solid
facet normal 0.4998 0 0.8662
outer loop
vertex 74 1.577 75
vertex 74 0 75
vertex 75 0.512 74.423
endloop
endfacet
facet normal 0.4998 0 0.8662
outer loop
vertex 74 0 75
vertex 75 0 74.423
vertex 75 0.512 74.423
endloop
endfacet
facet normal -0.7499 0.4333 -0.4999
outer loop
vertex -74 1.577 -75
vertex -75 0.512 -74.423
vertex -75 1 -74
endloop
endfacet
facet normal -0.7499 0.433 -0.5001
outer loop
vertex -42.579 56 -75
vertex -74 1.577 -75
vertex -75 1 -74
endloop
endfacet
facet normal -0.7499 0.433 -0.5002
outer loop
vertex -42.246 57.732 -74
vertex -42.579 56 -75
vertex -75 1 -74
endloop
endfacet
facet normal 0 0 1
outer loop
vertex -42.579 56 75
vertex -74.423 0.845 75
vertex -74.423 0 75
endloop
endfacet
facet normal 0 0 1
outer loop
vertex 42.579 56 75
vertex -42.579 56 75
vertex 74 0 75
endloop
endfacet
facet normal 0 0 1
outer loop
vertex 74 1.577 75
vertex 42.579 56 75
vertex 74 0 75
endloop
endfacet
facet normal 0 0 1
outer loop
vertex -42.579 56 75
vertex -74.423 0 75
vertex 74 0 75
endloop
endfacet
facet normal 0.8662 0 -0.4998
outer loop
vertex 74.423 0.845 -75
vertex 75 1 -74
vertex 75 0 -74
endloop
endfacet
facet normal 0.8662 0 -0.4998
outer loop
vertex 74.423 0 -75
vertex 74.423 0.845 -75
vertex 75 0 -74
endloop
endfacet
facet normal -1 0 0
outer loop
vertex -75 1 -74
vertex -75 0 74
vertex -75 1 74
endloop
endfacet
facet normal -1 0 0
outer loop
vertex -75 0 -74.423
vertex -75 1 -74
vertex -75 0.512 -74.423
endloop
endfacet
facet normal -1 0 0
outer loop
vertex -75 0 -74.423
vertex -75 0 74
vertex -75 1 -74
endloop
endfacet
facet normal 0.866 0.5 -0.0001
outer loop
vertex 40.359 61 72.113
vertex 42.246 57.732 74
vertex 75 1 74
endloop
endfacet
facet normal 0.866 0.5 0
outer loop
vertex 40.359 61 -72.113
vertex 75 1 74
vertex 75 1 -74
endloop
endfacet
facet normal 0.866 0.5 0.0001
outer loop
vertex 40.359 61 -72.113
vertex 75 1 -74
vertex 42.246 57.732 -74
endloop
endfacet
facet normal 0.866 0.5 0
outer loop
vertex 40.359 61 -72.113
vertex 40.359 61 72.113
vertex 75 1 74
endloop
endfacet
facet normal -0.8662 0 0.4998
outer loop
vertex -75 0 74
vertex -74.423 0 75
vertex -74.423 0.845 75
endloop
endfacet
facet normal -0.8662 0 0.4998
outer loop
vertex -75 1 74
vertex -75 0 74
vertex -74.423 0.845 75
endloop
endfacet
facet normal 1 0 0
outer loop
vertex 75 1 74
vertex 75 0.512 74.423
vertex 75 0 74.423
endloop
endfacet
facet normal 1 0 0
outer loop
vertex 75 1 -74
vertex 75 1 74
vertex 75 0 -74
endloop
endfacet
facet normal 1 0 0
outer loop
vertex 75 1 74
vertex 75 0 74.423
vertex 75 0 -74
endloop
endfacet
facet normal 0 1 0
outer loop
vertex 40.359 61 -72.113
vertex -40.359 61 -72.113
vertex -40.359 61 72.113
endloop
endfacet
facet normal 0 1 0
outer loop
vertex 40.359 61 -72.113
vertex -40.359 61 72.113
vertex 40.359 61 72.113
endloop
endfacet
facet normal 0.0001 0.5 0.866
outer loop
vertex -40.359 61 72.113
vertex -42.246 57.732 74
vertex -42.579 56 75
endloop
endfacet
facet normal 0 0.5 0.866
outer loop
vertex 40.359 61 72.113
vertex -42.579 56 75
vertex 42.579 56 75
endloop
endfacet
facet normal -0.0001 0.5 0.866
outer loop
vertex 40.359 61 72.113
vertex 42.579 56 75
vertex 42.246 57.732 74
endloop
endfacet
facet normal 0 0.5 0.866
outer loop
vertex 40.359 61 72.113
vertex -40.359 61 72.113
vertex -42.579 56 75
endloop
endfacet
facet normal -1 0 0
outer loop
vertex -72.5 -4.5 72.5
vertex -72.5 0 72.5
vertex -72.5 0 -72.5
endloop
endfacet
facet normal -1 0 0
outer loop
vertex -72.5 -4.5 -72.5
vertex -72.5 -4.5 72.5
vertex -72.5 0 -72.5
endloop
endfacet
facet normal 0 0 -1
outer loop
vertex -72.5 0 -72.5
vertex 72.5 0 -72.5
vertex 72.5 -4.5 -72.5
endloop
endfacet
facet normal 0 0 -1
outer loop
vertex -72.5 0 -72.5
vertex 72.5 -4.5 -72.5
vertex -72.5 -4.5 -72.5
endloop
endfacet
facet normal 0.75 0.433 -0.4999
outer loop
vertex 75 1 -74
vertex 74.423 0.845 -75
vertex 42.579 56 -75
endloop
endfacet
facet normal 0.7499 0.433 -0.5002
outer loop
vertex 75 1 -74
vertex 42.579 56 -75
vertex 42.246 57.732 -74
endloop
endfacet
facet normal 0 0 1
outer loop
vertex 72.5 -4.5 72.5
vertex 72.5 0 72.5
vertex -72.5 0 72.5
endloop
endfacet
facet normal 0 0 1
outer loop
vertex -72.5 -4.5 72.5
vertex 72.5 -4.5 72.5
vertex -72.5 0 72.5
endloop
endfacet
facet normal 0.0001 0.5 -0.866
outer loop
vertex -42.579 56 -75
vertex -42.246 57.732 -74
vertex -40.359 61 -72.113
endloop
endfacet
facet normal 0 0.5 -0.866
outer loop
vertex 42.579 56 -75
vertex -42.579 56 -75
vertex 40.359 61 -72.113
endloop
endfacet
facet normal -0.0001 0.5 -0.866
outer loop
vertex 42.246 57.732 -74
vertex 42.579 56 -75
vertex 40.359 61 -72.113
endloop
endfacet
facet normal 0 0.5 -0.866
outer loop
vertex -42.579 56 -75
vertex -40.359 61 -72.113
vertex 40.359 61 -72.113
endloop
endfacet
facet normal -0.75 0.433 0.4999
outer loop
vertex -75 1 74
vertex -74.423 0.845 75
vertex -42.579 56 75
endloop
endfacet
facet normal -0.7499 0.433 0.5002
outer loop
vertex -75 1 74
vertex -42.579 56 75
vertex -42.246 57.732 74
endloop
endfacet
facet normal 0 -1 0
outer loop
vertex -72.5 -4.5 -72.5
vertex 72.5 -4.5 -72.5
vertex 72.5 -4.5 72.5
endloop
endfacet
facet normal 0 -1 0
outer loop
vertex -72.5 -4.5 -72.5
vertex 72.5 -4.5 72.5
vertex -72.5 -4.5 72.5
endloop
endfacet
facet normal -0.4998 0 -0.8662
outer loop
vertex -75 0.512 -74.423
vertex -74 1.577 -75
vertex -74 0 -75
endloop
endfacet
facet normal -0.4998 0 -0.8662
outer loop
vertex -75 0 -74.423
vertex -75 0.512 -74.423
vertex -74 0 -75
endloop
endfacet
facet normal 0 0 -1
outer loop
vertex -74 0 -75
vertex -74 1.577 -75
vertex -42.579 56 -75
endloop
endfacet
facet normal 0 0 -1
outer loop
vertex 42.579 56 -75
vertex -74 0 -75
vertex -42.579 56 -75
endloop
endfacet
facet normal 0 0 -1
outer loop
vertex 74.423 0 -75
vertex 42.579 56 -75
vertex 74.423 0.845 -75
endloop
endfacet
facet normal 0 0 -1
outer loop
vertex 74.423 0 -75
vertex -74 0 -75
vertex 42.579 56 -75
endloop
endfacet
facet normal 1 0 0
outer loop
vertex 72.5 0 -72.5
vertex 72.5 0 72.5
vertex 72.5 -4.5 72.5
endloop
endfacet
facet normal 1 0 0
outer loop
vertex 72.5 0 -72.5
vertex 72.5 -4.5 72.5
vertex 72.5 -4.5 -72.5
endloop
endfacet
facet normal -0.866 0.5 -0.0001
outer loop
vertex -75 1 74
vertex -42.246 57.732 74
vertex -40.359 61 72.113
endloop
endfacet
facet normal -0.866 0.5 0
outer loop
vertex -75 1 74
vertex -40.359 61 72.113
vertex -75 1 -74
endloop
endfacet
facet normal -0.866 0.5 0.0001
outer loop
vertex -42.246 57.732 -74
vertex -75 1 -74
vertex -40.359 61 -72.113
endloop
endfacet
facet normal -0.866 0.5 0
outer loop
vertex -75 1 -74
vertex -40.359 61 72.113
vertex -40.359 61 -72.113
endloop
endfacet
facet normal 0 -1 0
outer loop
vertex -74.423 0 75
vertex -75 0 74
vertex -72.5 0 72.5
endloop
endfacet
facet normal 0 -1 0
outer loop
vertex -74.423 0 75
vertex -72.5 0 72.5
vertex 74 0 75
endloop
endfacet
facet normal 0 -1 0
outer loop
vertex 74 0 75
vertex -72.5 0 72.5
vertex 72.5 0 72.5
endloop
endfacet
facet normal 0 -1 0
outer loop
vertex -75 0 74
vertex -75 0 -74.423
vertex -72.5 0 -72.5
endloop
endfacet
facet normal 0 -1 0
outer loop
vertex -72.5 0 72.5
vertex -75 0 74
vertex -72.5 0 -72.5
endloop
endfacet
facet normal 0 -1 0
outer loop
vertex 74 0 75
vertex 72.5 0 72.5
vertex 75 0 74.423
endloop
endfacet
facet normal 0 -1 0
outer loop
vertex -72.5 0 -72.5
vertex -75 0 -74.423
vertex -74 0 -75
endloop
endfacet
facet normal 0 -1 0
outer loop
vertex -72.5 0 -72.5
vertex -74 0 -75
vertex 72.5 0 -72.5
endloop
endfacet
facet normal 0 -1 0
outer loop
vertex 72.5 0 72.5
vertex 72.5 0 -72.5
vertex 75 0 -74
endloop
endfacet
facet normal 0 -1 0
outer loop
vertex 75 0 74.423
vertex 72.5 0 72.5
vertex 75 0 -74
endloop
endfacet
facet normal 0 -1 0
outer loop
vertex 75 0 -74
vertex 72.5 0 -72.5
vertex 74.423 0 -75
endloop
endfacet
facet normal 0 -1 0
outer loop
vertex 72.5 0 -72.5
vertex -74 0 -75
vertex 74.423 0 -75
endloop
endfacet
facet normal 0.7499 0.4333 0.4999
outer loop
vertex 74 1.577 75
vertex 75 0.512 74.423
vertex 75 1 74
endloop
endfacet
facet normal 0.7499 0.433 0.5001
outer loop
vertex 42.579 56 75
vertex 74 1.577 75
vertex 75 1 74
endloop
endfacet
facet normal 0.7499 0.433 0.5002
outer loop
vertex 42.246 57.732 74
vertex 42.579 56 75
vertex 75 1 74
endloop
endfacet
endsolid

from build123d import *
from OCP.BRepFilletAPI import BRepFilletAPI_MakeChamfer

# Parameters (mm, degrees)
SKETCH1_W           = 150
SKETCH1_H           = 150
BOSS_EXTRUDE1_DEPTH = 1
SKETCH2_W           = 150
SKETCH2_H           = 150
BOSS_EXTRUDE2_DEPTH = 60
CHAMFER1_SIZE       = 60
CHAMFER1_SIZE2      = 34.641016151
CHAMFER2_SIZE       = 5
CHAMFER2_SIZE2      = 2.886751346
CHAMFER3_SIZE       = 1
CHAMFER3_SIZE2      = 0.577350269
CHAMFER4_SIZE       = 1
CHAMFER4_SIZE2      = 0.577350269
SKETCH3_W           = 145
SKETCH3_H           = 145
BOSS_EXTRUDE3_DEPTH = 4.5


with BuildPart() as part:
    # Sketch1 → Boss-Extrude1 (new body)
    with BuildSketch(Plane(origin=(0, 0, 0), x_dir=(1, 0, 0), z_dir=(0, 1, 0))):
        Rectangle(SKETCH1_W, SKETCH1_H)
    extrude(amount=BOSS_EXTRUDE1_DEPTH)

    # Sketch2 → Boss-Extrude2 (add)
    with BuildSketch(Plane(origin=(0, 1, 0), x_dir=(1, 0, 0), z_dir=(0, 1, 0))):
        Rectangle(SKETCH2_W, SKETCH2_H)
    extrude(amount=BOSS_EXTRUDE2_DEPTH)

    # Chamfer1: one chamfer whose edges measure the first distance from different faces: ONE call of the kernel's chamfer builder (chamfer() names one face for all edges)
    chamfer1_edges_1 = [part.edges().sort_by_distance(p)[0] for p in [
        (75, 61, 0),
    ]]
    chamfer1_side_1 = [part.faces().sort_by_distance(p)[0] for p in [
        (75, 30.5, 0),
    ]]
    chamfer1_edges_2 = [part.edges().sort_by_distance(p)[0] for p in [
        (-75, 61, 0),
    ]]
    chamfer1_side_2 = [part.faces().sort_by_distance(p)[0] for p in [
        (-75, 30.5, 0),
    ]]
    chamfer1 = BRepFilletAPI_MakeChamfer(part.part.solid().wrapped)
    for e in chamfer1_edges_1:
        chamfer1.Add(CHAMFER1_SIZE, CHAMFER1_SIZE2, e.wrapped, chamfer1_side_1[0].wrapped)  # the first distance lies on this face
    for e in chamfer1_edges_2:
        chamfer1.Add(CHAMFER1_SIZE, CHAMFER1_SIZE2, e.wrapped, chamfer1_side_2[0].wrapped)  # the first distance lies on this face
    add(Compound.cast(chamfer1.Shape()), mode=Mode.REPLACE)

    # Chamfer2: one chamfer whose edges measure the first distance from different faces: ONE call of the kernel's chamfer builder (chamfer() names one face for all edges)
    chamfer2_edges_1 = [part.edges().sort_by_distance(p)[0] for p in [
        (0, 61, -75),
    ]]
    chamfer2_side_1 = [part.faces().sort_by_distance(p)[0] for p in [
        (0, 27.413848587, -75),
    ]]
    chamfer2_edges_2 = [part.edges().sort_by_distance(p)[0] for p in [
        (0, 61, 75),
    ]]
    chamfer2_side_2 = [part.faces().sort_by_distance(p)[0] for p in [
        (0, 27.413848587, 75),
    ]]
    chamfer2 = BRepFilletAPI_MakeChamfer(part.part.solid().wrapped)
    for e in chamfer2_edges_1:
        chamfer2.Add(CHAMFER2_SIZE, CHAMFER2_SIZE2, e.wrapped, chamfer2_side_1[0].wrapped)  # the first distance lies on this face
    for e in chamfer2_edges_2:
        chamfer2.Add(CHAMFER2_SIZE, CHAMFER2_SIZE2, e.wrapped, chamfer2_side_2[0].wrapped)  # the first distance lies on this face
    add(Compound.cast(chamfer2.Shape()), mode=Mode.REPLACE)

    # Chamfer3: one chamfer whose edges measure the first distance from different faces: ONE call of the kernel's chamfer builder (chamfer() names one face for all edges)
    chamfer3_edges_1 = [part.edges().sort_by_distance(p)[0] for p in [
        (-75, 0.5, -75),
    ]]
    chamfer3_side_1 = [part.faces().sort_by_distance(p)[0] for p in [
        (0, 25.462591876, -75),
    ]]
    chamfer3_edges_2 = [part.edges().sort_by_distance(p)[0] for p in [
        (75, 0.5, -75),
    ]]
    chamfer3_side_2 = [part.faces().sort_by_distance(p)[0] for p in [
        (75, 0.5, 0),
    ]]
    chamfer3_edges_3 = [part.edges().sort_by_distance(p)[0] for p in [
        (75, 0.5, 75),
    ]]
    chamfer3_side_3 = [part.faces().sort_by_distance(p)[0] for p in [
        (0, 25.462591876, 75),
    ]]
    chamfer3_edges_4 = [part.edges().sort_by_distance(p)[0] for p in [
        (-75, 0.5, 75),
    ]]
    chamfer3_side_4 = [part.faces().sort_by_distance(p)[0] for p in [
        (-75, 0.5, 0),
    ]]
    chamfer3 = BRepFilletAPI_MakeChamfer(part.part.solid().wrapped)
    for e in chamfer3_edges_1:
        chamfer3.Add(CHAMFER3_SIZE, CHAMFER3_SIZE2, e.wrapped, chamfer3_side_1[0].wrapped)  # the first distance lies on this face
    for e in chamfer3_edges_2:
        chamfer3.Add(CHAMFER3_SIZE, CHAMFER3_SIZE2, e.wrapped, chamfer3_side_2[0].wrapped)  # the first distance lies on this face
    for e in chamfer3_edges_3:
        chamfer3.Add(CHAMFER3_SIZE, CHAMFER3_SIZE2, e.wrapped, chamfer3_side_3[0].wrapped)  # the first distance lies on this face
    for e in chamfer3_edges_4:
        chamfer3.Add(CHAMFER3_SIZE, CHAMFER3_SIZE2, e.wrapped, chamfer3_side_4[0].wrapped)  # the first distance lies on this face
    add(Compound.cast(chamfer3.Shape()), mode=Mode.REPLACE)

    # Chamfer4: one chamfer whose edges measure the first distance from different faces: ONE call of the kernel's chamfer builder (chamfer() names one face for all edges)
    chamfer4_edges_1 = [part.edges().sort_by_distance(p)[0] for p in [
        (-58.622867597, 29.366025404, -75),
        (-58.834192463, 29, 75),
    ]]
    chamfer4_side_1 = [part.faces().sort_by_distance(p)[0] for p in [
        (-57.703873012, 30.957770718, 7.84e-06),
    ]]
    chamfer4_edges_2 = [part.edges().sort_by_distance(p)[0] for p in [
        (58.834192463, 29, -75),
        (58.622867597, 29.366025404, 75),
    ]]
    chamfer4_side_2 = [part.faces().sort_by_distance(p)[0] for p in [
        (57.703873012, 30.957770718, -7.84e-06),
    ]]
    chamfer4 = BRepFilletAPI_MakeChamfer(part.part.solid().wrapped)
    for e in chamfer4_edges_1:
        chamfer4.Add(CHAMFER4_SIZE, CHAMFER4_SIZE2, e.wrapped, chamfer4_side_1[0].wrapped)  # the first distance lies on this face
    for e in chamfer4_edges_2:
        chamfer4.Add(CHAMFER4_SIZE, CHAMFER4_SIZE2, e.wrapped, chamfer4_side_2[0].wrapped)  # the first distance lies on this face
    add(Compound.cast(chamfer4.Shape()), mode=Mode.REPLACE)

    # Sketch3 → Boss-Extrude3 (add)
    with BuildSketch(Plane(origin=(0, 0, 0), x_dir=(-1, 0, 0), z_dir=(0, -1, 0))):
        Rectangle(SKETCH3_W, SKETCH3_H)
    extrude(amount=BOSS_EXTRUDE3_DEPTH)


solid = part.part
